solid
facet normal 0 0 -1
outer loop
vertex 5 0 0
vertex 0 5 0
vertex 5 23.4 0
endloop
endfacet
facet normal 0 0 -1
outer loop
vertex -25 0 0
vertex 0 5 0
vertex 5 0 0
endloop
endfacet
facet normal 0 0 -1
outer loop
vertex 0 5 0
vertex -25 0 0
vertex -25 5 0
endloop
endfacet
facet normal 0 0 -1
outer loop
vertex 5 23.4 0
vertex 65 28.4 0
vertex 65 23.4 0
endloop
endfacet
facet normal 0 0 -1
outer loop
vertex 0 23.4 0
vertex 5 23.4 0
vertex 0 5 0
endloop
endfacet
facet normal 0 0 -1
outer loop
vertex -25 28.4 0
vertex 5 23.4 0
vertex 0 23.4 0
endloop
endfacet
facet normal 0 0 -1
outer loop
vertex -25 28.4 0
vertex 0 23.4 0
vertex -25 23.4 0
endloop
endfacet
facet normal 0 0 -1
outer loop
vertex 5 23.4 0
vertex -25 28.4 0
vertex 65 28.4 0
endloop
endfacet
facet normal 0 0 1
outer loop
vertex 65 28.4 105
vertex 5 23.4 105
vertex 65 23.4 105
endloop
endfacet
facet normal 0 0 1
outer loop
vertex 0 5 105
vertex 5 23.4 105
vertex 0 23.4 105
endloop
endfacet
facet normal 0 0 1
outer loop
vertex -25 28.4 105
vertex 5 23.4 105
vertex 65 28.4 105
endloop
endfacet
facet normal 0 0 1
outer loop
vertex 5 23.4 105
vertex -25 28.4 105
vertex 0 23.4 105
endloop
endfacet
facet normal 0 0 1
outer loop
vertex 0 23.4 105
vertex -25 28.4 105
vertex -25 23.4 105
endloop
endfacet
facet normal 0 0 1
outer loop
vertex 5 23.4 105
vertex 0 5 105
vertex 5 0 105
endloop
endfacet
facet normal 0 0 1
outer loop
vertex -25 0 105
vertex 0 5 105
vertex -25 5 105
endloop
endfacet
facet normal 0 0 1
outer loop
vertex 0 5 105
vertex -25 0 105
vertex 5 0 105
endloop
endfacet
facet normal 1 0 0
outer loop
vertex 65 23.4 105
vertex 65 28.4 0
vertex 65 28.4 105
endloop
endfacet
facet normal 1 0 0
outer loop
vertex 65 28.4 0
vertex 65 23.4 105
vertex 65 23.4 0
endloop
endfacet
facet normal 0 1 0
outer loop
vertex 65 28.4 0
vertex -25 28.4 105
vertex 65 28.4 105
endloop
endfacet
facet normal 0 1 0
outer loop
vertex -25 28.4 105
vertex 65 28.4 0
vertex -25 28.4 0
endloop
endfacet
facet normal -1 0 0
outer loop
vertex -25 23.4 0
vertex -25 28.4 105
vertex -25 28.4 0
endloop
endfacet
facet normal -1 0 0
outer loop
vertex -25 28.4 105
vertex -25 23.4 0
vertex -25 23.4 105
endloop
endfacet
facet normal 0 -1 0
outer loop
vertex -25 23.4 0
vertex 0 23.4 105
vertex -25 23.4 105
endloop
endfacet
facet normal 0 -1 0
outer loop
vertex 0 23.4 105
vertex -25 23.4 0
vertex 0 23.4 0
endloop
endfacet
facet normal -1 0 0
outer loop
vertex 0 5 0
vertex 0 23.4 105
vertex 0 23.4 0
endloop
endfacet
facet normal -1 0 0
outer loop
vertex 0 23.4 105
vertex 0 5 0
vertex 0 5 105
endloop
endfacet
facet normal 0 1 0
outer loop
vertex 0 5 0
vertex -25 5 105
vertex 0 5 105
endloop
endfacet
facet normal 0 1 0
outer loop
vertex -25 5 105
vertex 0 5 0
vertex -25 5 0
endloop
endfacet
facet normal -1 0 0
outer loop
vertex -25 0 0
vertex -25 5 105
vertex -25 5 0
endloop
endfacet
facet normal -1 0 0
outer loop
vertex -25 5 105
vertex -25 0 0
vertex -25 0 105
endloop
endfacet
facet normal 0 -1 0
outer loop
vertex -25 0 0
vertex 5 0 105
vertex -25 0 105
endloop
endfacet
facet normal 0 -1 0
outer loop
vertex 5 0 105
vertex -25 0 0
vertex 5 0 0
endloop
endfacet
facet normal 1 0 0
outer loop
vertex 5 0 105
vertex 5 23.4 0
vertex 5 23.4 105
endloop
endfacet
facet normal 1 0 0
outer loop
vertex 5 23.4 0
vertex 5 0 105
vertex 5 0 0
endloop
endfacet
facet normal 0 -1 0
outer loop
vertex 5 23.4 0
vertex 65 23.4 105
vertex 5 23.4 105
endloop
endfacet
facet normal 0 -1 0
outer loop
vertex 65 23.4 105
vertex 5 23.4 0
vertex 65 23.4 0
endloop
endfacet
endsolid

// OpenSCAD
// Pipette Holder Clamp
// Designed for an 18mm thick shelf.
// Printed lying on its side (XY plane is the profile, Z is the extrusion/length).

// --- Dimensions ---
shelf_thickness = 18.0;
spine_x_end     = 5.0;
spine_y_end     = 28.4;

bottom_jaw_x_start = -25.0;
bottom_jaw_x_end   = 5.0;
bottom_jaw_y_end    = 5.0;

top_jaw_x_start    = -25.0;
top_jaw_x_end      = 65.0;
top_jaw_y_start    = 23.4;
top_jaw_y_end      = 28.4;

extrusion_z         = 105.0;

hole_diameter       = 20.0;
hole_x_center       = 42.0;
hole_y_center       = 17.5; // This is the vertical center in the profile (Y in profile, but Z in print)
hole_z_centers       = [17.5, 52.5, 87.5]; // The user specified Z positions for the holes

$fn = 64;

// The user requested the part be printed lying on its side.
// The profile is in the XY plane.
// The extrusion is along Z.
// The profile coordinates provided:
// Spine: x[0,5], y[0,28.4]
// Bottom Jaw: x[-25,5], y[0,5]
// Top Jaw/Arm: x[-25,65], y[23.4,28.4]

module profile() {
    union() {
        // Spine
        square([spine_x_end, spine_y_end]);
        // Bottom Jaw
        translate([bottom_jaw_x_start, 0]) 
            square([bottom_jaw_x_end - bottom_jaw_x_start, bottom_jaw_y_end]);
        // Top Jaw and Arm
        translate([top_jaw_x_start, top_jaw_y_start]) 
            square([top_jaw_x_end - top_jaw_x_start, top_jaw_y_end - top_jaw_y_start]);
    }
}

difference() {
    // Main Body
    linear_extrude(height = extrusion_z)
        profile();

    // Holes through the arm
    // The holes are "through the arm along Y (vertically in use)".
    // In the print orientation (XY profile, Z extrusion), "vertically in use" means the Y axis.
    // However, the user says "centred at x = 42 and z = 17.5, 52.5 and 87.5".
    // This implies the holes are drilled through the thickness of the arm (the Y direction).
    
    for (z_pos = hole_z_centers) {
        translate([hole_x_center, -1, z_pos])
            rotate([0, 90, 0])
                cylinder(h = 30, d = hole_diameter); // 30 is enough to clear the profile thickness
    }
}
